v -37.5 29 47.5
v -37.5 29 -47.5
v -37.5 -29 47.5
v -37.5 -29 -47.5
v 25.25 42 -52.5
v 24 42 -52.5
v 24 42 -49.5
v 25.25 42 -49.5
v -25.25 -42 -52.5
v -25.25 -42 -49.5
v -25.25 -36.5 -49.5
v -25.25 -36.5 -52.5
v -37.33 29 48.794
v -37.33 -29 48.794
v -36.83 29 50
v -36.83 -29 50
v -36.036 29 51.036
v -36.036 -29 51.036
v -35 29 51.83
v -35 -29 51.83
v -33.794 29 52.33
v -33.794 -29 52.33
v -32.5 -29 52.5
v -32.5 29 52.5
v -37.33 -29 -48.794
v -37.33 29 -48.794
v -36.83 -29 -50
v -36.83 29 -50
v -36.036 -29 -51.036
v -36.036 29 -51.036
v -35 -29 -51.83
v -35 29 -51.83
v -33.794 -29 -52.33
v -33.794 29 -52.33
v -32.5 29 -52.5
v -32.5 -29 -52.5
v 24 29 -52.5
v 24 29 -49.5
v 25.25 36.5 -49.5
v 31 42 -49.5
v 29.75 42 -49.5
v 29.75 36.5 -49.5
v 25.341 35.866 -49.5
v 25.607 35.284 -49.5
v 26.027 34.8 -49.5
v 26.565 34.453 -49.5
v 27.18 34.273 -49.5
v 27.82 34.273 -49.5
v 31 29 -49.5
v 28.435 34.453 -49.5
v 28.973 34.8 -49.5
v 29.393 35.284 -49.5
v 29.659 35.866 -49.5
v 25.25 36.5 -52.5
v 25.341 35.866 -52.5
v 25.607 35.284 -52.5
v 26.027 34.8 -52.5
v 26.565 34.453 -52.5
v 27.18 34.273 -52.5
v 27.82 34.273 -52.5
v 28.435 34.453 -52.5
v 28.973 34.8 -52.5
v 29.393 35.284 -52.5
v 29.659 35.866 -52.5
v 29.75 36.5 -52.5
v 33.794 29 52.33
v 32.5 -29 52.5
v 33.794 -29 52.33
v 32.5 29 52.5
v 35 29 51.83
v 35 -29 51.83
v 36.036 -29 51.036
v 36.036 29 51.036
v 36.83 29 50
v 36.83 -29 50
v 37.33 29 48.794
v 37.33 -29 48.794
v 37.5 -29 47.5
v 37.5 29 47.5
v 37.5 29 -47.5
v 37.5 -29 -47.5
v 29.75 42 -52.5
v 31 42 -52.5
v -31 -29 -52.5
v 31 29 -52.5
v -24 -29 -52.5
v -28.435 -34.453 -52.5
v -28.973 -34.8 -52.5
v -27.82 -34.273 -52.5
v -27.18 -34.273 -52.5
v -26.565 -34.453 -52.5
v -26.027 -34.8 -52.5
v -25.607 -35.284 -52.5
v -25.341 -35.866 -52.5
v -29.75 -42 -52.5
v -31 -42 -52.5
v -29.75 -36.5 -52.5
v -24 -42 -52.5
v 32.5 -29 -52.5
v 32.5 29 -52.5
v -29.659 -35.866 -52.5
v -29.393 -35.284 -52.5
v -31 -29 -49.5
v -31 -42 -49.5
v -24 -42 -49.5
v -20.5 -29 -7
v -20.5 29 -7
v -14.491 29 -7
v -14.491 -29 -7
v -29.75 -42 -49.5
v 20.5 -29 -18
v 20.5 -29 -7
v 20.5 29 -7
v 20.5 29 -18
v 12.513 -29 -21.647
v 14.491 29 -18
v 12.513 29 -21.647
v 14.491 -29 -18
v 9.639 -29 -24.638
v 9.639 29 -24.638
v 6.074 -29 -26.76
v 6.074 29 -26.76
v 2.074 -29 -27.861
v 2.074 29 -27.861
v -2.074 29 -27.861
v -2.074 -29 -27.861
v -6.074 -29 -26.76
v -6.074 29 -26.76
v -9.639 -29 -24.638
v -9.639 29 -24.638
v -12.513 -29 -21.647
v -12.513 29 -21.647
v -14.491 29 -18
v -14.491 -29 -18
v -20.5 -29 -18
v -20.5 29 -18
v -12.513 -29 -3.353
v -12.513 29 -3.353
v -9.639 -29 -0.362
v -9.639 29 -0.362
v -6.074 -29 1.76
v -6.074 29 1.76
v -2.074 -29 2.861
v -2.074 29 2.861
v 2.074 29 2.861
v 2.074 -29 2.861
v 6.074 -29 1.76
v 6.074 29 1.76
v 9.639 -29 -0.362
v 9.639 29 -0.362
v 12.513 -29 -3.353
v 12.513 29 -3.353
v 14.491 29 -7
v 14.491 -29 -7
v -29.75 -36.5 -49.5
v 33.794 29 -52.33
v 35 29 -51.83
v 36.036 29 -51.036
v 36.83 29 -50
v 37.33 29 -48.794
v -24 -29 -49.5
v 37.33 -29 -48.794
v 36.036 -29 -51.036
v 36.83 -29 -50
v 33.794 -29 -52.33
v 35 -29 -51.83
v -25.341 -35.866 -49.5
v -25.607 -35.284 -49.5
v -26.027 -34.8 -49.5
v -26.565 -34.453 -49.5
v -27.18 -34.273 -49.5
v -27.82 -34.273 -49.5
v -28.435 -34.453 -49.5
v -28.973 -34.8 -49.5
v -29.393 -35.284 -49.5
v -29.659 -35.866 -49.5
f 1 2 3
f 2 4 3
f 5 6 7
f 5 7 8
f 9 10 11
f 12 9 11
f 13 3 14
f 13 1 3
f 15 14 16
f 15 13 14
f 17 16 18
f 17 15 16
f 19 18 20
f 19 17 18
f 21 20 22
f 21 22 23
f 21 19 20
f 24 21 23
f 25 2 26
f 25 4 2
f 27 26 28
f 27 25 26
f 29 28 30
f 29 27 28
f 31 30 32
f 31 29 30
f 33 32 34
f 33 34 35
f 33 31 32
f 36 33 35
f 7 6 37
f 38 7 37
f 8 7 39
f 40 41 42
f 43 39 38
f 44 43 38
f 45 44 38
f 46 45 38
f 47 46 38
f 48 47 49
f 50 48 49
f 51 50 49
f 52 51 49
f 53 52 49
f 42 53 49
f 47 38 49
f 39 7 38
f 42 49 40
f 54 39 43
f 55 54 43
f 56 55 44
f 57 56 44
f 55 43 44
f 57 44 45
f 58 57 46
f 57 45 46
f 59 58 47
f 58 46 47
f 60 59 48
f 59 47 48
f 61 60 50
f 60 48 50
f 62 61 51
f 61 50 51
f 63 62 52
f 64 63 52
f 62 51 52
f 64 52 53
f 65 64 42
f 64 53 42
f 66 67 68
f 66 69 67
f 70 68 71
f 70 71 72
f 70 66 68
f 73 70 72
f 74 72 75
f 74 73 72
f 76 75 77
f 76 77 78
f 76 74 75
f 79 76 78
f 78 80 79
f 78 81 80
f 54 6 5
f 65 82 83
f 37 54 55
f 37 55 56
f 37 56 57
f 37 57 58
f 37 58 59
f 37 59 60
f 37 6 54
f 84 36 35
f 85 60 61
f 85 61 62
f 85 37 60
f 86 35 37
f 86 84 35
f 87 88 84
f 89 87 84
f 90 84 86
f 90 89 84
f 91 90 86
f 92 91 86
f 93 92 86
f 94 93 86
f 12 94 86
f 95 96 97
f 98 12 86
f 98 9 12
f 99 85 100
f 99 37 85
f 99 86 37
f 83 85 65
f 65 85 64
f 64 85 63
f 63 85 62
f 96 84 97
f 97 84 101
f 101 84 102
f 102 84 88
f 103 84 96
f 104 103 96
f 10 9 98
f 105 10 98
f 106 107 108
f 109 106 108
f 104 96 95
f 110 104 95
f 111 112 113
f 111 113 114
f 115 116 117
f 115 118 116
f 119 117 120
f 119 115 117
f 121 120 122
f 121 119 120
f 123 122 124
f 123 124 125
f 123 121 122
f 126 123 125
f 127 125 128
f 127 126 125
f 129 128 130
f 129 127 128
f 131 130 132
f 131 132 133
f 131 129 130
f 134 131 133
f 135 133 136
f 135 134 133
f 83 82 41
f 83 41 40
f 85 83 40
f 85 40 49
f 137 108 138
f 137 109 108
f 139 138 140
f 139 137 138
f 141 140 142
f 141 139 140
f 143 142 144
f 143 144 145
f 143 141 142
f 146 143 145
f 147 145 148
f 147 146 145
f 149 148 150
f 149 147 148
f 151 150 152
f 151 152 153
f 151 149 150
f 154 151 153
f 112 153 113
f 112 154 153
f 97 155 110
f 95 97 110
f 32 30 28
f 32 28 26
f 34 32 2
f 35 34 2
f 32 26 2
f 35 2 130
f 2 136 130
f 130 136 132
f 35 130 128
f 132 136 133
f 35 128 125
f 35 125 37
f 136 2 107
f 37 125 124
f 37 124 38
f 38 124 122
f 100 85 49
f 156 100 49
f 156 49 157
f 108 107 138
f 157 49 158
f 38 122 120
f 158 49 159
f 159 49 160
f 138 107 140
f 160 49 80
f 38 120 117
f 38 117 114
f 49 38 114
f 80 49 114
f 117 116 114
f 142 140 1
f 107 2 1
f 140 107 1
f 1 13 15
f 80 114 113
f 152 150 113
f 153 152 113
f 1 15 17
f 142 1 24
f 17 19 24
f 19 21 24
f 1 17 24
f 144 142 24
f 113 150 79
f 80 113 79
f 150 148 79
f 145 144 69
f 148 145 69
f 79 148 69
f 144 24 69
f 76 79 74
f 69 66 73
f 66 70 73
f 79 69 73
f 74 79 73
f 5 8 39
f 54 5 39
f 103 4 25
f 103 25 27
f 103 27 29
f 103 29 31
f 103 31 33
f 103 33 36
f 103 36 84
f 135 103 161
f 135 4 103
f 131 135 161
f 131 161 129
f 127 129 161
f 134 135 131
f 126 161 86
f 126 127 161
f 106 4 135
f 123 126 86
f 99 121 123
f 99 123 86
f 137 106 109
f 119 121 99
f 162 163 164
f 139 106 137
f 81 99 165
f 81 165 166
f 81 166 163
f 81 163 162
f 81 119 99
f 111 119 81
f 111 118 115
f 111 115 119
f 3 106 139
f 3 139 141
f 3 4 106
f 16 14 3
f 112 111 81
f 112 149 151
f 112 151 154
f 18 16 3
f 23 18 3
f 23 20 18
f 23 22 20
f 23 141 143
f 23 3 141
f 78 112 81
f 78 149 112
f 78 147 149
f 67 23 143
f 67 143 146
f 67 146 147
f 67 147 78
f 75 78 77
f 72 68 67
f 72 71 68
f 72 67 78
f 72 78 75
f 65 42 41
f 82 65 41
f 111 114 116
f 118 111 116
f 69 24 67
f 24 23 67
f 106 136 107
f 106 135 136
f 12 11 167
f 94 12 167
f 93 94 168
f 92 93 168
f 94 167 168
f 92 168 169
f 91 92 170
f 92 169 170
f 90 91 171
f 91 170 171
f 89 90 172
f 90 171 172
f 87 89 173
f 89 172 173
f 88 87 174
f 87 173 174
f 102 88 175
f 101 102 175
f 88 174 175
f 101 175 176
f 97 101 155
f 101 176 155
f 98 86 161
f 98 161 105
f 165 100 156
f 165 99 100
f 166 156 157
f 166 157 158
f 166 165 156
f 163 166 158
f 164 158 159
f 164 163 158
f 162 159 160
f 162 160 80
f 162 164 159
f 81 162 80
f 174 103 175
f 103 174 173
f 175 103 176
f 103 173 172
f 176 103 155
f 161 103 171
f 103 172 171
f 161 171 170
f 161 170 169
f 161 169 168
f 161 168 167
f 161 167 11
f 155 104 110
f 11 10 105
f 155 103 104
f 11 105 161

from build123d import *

# Parameters (mm, degrees)
F0_W     = 75
F0_H     = 105
F1_DEPTH = 29
F2_W     = 7
F2_H     = 13
F3_DEPTH = 3
F6_DEPTH = 25
F7_R     = 5


with BuildPart() as f1:
    # F0 (on Front) → F1 (new body, symmetric)
    with BuildSketch(Plane.XZ):
        Rectangle(F0_W, F0_H)
        with BuildLine():
            Line((20.5, -7), (20.5, -18))
            Line((20.5, -18), (14.491377, -18))
            ThreePointArc((14.491377, -18), (0, -28), (-14.491377, -18))
            Line((-14.491377, -18), (-20.5, -18))
            Line((-20.5, -18), (-20.5, -7))
            Line((-20.5, -7), (-14.491377, -7))
            ThreePointArc((-14.491377, -7), (0, 3), (14.491377, -7))
            Line((14.491377, -7), (20.5, -7))
        make_face(mode=Mode.SUBTRACT)
    extrude(amount=F1_DEPTH, both=True)

    # F2 (on face) → F3 (join)
    with BuildSketch(Plane(origin=(0, 0, -52.5), x_dir=(1, 0, 0), z_dir=(0, 0, -1))):
        with Locations((-27.5, 35.5)):
            Rectangle(F2_W, F2_H)
        with Locations((27.5, -35.5)):
            Rectangle(F2_W, F2_H)
    extrude(amount=-F3_DEPTH)

    # F5 (on face) + F4 (on face) → F6 (cut)
    with BuildSketch(Plane.XY.offset(-49.5)):
        with BuildLine():
            Line((25.25, 42), (25.25, 36.5))
            ThreePointArc((25.25, 36.5), (27.5, 34.25), (29.75, 36.5))
            Line((29.75, 36.5), (29.75, 42))
            Line((29.75, 42), (25.25, 42))
        make_face()
    with BuildSketch(Plane.XY.offset(-49.5)):
        with BuildLine():
            Line((-25.25, -42), (-25.25, -36.5))
            ThreePointArc((-25.25, -36.5), (-27.5, -34.25), (-29.75, -36.5))
            Line((-29.75, -36.5), (-29.75, -42))
            Line((-29.75, -42), (-25.25, -42))
        make_face()
    extrude(amount=-F6_DEPTH, mode=Mode.SUBTRACT)

    # F7
    f7_edges = [f1.edges().sort_by_distance(p)[0] for p in [
        (-37.5, 0, -52.5),
        (37.5, 0, -52.5),
        (37.5, 0, 52.5),
        (-37.5, 0, 52.5),
    ]]
    fillet(f7_edges, radius=F7_R)


solid = f1.part
